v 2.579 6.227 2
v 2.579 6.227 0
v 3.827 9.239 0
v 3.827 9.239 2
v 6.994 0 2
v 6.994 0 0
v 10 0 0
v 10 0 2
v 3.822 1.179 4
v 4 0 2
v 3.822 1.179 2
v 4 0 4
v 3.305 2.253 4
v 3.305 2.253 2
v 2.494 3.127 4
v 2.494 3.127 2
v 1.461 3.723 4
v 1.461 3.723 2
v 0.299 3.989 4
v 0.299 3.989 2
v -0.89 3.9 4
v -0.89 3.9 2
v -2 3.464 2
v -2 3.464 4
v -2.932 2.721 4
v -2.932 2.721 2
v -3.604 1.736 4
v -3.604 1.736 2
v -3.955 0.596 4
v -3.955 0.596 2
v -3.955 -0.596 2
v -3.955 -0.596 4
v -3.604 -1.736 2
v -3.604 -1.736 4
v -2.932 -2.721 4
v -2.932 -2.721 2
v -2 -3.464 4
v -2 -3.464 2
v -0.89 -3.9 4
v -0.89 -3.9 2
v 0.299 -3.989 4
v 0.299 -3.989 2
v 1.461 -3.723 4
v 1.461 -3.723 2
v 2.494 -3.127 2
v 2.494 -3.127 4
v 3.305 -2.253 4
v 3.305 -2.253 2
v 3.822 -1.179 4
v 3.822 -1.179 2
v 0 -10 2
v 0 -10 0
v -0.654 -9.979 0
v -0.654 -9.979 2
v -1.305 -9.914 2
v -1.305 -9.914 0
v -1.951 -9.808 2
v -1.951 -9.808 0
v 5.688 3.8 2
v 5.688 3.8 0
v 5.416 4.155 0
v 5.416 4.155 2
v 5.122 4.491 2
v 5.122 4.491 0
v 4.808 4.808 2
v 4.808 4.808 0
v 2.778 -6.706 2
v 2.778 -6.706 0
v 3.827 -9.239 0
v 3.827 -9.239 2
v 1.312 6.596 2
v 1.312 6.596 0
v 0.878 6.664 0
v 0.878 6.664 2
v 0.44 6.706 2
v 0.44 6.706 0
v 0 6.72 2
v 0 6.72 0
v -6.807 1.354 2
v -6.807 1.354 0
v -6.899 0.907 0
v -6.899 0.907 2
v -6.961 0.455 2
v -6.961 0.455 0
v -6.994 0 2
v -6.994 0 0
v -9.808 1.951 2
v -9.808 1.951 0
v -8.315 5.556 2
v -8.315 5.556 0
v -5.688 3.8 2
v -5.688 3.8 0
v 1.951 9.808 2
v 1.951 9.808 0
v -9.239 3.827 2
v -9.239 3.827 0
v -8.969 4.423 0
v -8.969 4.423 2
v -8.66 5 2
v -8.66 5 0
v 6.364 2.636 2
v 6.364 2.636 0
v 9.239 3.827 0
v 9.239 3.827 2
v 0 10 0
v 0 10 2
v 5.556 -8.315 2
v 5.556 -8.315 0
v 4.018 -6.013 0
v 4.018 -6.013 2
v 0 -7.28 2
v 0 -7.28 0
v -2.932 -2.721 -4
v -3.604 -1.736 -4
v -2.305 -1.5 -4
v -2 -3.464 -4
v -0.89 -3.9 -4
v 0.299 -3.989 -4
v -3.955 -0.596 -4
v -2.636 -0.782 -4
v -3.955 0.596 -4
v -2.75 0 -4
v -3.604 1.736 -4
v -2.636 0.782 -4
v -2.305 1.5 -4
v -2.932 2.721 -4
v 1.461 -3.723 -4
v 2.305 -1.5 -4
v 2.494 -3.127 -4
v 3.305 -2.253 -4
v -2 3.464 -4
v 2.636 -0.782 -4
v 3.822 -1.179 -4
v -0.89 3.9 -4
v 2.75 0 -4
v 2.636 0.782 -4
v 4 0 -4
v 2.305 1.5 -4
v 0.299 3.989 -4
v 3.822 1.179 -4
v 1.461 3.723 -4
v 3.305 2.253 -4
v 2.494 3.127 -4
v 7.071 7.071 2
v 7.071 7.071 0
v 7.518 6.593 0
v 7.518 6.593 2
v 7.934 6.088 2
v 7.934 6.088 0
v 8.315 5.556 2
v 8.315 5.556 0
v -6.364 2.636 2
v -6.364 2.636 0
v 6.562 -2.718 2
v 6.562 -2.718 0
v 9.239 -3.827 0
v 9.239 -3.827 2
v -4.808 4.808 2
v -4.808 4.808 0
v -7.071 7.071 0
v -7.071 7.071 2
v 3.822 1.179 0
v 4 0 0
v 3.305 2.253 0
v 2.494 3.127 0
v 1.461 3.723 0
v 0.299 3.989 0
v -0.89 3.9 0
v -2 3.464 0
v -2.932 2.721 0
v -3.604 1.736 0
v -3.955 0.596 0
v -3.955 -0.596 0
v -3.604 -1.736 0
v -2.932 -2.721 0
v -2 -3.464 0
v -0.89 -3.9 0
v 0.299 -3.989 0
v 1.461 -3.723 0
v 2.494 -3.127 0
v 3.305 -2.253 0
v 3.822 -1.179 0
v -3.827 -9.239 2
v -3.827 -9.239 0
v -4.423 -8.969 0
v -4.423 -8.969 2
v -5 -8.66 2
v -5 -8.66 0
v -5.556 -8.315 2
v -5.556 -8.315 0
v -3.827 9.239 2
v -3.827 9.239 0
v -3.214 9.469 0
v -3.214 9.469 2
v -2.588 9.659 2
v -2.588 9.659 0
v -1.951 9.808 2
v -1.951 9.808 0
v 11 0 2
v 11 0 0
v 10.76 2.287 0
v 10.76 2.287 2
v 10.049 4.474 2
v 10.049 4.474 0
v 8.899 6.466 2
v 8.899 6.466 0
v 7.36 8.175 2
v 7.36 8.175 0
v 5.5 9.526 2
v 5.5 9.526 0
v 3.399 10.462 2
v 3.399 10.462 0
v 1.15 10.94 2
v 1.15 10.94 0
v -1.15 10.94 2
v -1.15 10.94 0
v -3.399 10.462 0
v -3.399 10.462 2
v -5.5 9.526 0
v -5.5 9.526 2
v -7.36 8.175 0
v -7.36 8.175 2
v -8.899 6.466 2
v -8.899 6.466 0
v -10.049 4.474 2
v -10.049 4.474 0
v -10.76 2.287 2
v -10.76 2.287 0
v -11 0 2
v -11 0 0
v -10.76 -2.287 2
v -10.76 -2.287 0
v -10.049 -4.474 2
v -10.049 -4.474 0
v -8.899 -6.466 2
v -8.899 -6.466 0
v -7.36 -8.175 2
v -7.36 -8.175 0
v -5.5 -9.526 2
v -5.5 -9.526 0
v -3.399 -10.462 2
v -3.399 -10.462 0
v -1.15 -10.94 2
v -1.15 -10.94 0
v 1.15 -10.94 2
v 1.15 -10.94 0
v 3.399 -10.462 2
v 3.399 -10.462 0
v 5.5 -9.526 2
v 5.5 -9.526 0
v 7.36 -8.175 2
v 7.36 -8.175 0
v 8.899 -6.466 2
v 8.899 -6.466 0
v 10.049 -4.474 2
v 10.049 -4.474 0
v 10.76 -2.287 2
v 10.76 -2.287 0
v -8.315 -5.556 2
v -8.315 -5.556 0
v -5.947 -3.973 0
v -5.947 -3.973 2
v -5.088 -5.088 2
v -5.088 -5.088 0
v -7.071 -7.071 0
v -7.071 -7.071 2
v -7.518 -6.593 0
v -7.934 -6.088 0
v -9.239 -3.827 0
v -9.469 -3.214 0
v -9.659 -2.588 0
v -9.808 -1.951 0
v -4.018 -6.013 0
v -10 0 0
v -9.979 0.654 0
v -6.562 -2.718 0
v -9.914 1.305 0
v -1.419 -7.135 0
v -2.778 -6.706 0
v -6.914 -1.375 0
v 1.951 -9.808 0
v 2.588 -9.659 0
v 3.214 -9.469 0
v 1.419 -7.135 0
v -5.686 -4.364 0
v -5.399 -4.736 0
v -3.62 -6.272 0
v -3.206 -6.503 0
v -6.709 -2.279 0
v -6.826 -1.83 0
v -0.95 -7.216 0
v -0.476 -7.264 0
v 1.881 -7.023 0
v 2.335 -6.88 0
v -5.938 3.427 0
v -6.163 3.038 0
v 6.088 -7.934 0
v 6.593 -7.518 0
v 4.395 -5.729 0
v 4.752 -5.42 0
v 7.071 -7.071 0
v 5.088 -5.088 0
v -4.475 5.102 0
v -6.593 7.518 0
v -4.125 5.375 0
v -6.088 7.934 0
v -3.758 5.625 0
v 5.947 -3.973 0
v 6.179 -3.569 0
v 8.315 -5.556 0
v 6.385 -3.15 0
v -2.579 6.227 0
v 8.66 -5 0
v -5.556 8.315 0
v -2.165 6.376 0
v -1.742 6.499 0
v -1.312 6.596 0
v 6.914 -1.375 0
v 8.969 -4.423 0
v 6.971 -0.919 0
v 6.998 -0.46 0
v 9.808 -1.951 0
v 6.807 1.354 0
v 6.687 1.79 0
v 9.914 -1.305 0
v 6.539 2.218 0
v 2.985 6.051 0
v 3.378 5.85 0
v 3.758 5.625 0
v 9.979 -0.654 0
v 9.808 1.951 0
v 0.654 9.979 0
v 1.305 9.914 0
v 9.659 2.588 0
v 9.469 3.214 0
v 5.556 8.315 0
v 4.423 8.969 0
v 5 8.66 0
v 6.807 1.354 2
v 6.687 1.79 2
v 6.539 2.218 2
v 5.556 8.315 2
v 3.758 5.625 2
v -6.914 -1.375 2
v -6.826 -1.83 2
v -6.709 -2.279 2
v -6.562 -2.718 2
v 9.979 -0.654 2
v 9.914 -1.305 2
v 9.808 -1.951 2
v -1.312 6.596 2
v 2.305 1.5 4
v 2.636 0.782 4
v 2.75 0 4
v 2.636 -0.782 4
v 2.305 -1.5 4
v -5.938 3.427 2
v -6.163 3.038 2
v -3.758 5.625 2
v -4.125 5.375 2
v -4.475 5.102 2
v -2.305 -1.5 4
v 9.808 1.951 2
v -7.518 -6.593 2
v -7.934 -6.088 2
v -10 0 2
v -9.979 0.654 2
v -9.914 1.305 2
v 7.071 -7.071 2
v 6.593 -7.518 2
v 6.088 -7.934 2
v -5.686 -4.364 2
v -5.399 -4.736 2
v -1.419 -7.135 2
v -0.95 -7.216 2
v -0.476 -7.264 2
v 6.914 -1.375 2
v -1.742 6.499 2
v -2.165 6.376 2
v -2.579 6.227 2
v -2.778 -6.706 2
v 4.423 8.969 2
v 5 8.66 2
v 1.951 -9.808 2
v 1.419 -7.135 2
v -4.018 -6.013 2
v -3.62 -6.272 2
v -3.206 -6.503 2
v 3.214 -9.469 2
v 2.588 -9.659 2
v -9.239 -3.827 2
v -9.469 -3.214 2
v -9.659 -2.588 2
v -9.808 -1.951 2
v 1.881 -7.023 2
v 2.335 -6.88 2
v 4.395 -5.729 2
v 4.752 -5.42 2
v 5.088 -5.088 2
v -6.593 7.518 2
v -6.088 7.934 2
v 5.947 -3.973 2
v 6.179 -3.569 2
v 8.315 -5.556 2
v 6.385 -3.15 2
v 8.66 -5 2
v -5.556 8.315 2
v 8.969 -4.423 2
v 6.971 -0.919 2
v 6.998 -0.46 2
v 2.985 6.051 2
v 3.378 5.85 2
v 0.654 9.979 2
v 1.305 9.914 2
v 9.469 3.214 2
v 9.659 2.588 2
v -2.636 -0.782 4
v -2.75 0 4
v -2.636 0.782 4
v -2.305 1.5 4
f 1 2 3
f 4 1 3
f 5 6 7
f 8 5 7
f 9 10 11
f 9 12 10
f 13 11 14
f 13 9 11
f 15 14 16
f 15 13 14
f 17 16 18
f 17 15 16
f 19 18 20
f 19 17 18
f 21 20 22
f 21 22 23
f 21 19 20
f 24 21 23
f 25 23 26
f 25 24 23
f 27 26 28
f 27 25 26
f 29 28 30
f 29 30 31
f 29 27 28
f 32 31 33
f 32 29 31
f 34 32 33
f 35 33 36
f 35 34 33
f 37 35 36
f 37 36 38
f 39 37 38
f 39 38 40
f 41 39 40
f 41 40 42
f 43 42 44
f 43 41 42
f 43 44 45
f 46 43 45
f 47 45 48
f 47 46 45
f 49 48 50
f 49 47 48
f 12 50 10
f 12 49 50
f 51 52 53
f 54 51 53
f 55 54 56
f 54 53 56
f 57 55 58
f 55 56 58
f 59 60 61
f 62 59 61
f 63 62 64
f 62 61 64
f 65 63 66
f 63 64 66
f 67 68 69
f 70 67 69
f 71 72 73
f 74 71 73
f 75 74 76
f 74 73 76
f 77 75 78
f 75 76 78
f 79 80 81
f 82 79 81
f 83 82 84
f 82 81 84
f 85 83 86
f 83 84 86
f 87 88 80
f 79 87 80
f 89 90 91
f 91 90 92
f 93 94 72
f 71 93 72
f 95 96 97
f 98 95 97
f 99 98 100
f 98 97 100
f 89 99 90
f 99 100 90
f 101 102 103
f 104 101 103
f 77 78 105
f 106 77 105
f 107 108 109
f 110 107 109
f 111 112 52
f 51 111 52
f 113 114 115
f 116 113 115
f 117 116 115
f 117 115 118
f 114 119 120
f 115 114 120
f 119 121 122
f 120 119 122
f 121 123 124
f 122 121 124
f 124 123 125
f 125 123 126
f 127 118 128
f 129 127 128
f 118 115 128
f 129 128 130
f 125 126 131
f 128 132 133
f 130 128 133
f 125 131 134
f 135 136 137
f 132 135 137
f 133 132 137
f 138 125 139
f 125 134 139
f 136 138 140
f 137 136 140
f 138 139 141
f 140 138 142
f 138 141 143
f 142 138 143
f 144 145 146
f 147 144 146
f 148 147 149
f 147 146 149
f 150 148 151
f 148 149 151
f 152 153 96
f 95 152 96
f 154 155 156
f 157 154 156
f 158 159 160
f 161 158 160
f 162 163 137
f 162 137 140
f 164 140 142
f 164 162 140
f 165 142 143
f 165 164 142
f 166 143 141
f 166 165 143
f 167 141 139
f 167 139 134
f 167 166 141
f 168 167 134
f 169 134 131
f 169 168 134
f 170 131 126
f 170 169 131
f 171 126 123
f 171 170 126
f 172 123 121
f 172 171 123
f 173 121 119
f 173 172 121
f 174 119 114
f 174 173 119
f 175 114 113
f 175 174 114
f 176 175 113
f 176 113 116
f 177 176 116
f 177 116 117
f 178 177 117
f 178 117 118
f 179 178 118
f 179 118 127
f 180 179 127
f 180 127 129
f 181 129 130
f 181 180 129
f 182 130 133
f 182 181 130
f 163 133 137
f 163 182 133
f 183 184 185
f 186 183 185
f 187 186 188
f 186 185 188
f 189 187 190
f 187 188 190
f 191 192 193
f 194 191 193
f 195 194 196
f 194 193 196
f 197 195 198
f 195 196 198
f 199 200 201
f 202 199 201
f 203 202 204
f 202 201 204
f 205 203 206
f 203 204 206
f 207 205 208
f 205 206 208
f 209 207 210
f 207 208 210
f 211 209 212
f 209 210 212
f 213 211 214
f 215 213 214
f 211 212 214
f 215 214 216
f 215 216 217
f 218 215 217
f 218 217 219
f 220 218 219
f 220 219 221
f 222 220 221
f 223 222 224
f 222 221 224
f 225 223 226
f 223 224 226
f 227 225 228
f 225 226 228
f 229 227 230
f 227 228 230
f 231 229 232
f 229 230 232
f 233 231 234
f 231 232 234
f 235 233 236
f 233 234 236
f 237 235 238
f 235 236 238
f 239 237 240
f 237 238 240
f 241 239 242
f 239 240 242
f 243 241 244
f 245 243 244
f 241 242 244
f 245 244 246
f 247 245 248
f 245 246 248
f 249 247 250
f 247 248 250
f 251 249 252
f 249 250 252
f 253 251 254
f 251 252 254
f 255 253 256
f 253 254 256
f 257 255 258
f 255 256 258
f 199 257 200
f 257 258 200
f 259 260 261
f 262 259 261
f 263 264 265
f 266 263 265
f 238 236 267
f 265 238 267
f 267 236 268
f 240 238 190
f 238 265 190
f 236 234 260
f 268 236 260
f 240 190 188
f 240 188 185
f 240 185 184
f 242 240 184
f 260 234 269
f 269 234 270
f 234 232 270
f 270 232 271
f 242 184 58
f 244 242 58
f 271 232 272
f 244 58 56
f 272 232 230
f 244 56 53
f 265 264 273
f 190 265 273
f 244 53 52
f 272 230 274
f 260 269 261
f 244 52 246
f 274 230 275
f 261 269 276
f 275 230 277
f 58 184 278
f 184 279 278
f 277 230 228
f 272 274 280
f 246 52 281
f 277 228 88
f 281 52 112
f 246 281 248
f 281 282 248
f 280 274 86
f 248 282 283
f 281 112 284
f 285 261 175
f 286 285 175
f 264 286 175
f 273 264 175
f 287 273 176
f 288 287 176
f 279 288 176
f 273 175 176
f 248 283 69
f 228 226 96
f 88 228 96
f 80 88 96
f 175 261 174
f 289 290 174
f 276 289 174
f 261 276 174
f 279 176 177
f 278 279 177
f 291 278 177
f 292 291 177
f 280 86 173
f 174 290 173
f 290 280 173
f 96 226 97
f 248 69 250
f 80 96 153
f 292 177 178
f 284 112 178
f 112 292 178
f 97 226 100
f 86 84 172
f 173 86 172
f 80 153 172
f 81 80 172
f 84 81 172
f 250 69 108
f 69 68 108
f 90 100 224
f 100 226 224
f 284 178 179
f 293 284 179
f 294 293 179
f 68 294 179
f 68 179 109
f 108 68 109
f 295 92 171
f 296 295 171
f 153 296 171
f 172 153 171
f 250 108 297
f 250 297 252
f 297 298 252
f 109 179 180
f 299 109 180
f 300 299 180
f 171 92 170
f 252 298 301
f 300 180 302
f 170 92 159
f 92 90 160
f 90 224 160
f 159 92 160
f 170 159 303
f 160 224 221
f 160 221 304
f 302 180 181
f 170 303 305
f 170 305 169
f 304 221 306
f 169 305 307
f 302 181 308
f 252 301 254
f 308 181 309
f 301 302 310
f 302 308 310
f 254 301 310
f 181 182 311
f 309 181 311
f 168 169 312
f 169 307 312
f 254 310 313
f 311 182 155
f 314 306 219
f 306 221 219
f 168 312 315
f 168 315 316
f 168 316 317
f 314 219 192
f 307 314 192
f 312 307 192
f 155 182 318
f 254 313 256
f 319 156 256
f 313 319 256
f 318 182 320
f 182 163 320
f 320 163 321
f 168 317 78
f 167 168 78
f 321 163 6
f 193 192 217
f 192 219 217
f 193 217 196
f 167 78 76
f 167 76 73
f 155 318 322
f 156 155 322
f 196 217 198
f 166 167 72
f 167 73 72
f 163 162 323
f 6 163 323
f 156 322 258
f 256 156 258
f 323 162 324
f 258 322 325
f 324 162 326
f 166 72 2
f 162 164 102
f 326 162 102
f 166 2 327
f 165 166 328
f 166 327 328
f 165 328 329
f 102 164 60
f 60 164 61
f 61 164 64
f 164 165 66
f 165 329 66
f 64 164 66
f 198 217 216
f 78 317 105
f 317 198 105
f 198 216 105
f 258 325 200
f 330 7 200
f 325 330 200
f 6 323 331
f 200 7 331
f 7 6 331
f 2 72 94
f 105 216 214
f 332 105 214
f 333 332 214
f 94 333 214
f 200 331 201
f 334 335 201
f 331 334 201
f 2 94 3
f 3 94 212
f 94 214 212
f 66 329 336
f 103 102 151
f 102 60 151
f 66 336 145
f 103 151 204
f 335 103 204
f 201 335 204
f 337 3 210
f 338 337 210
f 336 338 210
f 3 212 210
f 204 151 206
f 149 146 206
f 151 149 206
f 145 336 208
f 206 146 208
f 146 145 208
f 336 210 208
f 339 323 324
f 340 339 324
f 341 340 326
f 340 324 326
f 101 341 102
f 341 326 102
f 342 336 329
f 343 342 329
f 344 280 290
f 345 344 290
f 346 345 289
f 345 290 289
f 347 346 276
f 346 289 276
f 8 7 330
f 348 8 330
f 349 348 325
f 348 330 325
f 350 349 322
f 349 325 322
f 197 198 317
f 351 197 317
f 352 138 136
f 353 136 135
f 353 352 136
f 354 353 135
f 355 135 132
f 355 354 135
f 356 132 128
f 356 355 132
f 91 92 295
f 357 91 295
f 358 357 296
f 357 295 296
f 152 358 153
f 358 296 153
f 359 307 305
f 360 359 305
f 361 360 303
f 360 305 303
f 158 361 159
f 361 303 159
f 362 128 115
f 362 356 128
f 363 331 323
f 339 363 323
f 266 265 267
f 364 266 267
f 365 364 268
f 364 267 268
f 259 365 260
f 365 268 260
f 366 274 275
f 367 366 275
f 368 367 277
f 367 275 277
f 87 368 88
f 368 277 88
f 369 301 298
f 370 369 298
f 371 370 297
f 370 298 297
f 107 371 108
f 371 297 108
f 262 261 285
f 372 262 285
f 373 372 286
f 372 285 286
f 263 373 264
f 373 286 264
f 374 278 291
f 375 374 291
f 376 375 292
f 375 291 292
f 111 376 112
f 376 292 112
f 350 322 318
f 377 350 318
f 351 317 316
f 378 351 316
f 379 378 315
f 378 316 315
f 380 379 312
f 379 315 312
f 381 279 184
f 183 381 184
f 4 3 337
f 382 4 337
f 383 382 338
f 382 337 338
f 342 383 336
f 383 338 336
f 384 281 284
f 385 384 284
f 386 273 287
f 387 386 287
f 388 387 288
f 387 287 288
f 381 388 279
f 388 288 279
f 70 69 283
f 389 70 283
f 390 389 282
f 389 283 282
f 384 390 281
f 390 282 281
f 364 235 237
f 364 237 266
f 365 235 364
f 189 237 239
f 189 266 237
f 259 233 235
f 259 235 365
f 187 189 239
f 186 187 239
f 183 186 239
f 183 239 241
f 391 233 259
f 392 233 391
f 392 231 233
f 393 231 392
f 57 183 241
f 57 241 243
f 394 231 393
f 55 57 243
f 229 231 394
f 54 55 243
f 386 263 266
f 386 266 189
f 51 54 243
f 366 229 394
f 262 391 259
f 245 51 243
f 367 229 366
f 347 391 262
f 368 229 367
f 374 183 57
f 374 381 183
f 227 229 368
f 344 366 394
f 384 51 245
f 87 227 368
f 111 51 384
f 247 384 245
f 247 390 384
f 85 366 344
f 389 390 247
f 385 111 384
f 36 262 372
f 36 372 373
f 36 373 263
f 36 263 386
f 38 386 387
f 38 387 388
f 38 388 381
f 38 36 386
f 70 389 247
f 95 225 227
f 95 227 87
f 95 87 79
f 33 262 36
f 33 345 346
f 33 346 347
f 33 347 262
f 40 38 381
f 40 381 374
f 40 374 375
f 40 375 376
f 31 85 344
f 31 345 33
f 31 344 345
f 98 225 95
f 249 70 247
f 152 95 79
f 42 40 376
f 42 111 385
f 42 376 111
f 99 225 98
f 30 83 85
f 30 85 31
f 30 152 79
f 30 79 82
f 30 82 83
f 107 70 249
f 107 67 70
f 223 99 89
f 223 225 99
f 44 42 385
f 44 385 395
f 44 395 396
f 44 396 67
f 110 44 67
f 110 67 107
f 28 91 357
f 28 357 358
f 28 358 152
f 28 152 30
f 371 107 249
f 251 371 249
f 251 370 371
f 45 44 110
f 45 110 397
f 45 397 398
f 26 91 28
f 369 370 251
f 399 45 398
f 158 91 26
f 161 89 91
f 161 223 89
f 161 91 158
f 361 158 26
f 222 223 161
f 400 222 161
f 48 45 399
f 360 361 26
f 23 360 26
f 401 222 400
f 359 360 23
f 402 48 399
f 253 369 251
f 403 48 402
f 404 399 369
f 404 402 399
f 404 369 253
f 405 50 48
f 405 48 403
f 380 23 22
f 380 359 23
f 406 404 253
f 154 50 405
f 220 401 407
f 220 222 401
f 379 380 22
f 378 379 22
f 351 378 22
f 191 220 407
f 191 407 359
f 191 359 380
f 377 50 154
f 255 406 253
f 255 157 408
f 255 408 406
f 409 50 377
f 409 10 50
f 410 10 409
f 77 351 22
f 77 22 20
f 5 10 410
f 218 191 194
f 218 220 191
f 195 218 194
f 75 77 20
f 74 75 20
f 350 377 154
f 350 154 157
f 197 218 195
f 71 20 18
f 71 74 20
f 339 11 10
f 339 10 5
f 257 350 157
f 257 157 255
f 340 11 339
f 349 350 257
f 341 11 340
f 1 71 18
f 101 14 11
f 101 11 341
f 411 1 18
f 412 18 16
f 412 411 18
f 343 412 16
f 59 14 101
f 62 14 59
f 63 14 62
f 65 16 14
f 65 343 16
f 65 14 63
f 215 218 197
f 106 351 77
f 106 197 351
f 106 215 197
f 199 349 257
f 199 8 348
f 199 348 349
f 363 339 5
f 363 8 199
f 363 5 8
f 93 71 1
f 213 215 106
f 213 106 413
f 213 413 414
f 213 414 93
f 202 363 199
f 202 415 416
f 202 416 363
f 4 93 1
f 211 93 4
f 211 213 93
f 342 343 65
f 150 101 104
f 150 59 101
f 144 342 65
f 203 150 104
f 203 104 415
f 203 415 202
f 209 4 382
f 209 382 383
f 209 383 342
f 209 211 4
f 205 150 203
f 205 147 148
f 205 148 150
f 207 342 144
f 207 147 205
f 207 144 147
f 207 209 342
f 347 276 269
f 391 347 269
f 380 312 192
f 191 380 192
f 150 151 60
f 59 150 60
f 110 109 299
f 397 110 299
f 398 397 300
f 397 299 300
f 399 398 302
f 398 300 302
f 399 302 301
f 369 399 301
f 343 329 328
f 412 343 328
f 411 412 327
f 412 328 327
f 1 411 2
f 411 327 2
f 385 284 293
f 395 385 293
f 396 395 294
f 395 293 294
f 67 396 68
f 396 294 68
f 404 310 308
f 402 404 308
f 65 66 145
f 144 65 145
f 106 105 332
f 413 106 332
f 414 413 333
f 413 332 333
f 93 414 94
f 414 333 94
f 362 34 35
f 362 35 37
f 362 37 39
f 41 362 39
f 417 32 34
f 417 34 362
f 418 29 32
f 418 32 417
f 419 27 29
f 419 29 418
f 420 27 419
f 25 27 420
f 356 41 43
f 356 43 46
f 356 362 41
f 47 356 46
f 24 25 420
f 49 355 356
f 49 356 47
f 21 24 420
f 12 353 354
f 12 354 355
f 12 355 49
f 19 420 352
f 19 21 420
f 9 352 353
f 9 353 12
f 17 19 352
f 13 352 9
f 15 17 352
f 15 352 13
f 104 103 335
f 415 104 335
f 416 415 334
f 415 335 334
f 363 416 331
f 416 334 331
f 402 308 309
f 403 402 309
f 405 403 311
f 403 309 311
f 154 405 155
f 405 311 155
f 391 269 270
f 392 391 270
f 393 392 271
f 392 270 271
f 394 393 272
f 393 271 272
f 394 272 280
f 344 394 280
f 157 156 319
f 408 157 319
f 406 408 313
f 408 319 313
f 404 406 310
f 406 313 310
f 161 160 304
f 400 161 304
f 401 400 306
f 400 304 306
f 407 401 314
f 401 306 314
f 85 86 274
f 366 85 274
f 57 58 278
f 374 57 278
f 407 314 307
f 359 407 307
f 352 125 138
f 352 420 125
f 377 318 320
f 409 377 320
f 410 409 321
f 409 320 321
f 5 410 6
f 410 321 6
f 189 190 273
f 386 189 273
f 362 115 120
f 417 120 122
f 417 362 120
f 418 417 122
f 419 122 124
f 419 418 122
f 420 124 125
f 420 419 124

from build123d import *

# Parameters (mm, degrees)
F0_R     = 4
F1_DEPTH = 4
F0_R_2   = 11
F2_DEPTH = 2


with BuildPart() as f1:
    # F0 (on Top) → F1 (new body, symmetric)
    with BuildSketch(Plane.XY):
        Circle(F0_R)
        with BuildLine():
            ThreePointArc((-2.304886, -1.5), (-2.75, 0), (-2.304886, 1.5))
            Line((-2.304886, 1.5), (2.304886, 1.5))
            ThreePointArc((2.304886, 1.5), (2.75, 0), (2.304886, -1.5))
            Line((2.304886, -1.5), (-2.304886, -1.5))
        make_face(mode=Mode.SUBTRACT)
    extrude(amount=F1_DEPTH, both=True)

    # F0 (on Top) → F2 (join)
    with BuildSketch(Plane.XY):
        Circle(F0_R_2)
        with BuildLine():
            Line((-8.314696, -5.555702), (-5.946591, -3.973385))
            ThreePointArc((-5.946591, -3.973385), (-5.545353, -4.552303), (-5.087967, -5.087967))
            Line((-5.087967, -5.087967), (-7.071068, -7.071068))
            ThreePointArc((-7.071068, -7.071068), (-7.730105, -6.343933), (-8.314696, -5.555702))
        make_face(mode=Mode.SUBTRACT)
        with BuildLine():
            ThreePointArc((0, -10), (-0.980171, -9.951847), (-1.950903, -9.807853))
            Line((-1.950903, -9.807853), (-1.419245, -7.135026))
            ThreePointArc((-1.419245, -7.135026), (-0.713336, -7.24397), (0, -7.280411))
            Line((0, -7.280411), (0, -10))
        make_face(mode=Mode.SUBTRACT)
        with BuildLine():
            Line((-5.555702, -8.314696), (-4.017561, -6.012706))
            ThreePointArc((-4.017561, -6.012706), (-3.41521, -6.390758), (-2.77761, -6.705743))
            Line((-2.77761, -6.705743), (-3.826834, -9.238795))
            ThreePointArc((-3.826834, -9.238795), (-4.713967, -8.819213), (-5.555702, -8.314696))
        make_face(mode=Mode.SUBTRACT)
        with BuildLine():
            Line((-9.807853, -1.950903), (-6.91385, -1.37525))
            ThreePointArc((-6.91385, -1.37525), (-6.771225, -2.055379), (-6.561866, -2.718014))
            Line((-6.561866, -2.718014), (-9.238795, -3.826834))
            ThreePointArc((-9.238795, -3.826834), (-9.569403, -2.902847), (-9.807853, -1.950903))
        make_face(mode=Mode.SUBTRACT)
        with BuildLine():
            Line((1.950903, -9.807853), (1.419245, -7.135026))
            ThreePointArc((1.419245, -7.135026), (2.109376, -6.95503), (2.77761, -6.705743))
            Line((2.77761, -6.705743), (3.826834, -9.238795))
            ThreePointArc((3.826834, -9.238795), (2.902847, -9.569403), (1.950903, -9.807853))
        make_face(mode=Mode.SUBTRACT)
        with BuildLine():
            Line((5.555702, -8.314696), (4.017561, -6.012706))
            ThreePointArc((4.017561, -6.012706), (4.576183, -5.577444), (5.087967, -5.087967))
            Line((5.087967, -5.087967), (7.071068, -7.071068))
            ThreePointArc((7.071068, -7.071068), (6.343933, -7.730105), (5.555702, -8.314696))
        make_face(mode=Mode.SUBTRACT)
        with BuildLine():
            Line((8.314696, -5.555702), (5.946591, -3.973385))
            ThreePointArc((5.946591, -3.973385), (6.285648, -3.361098), (6.561866, -2.718014))
            Line((6.561866, -2.718014), (9.238795, -3.826834))
            ThreePointArc((9.238795, -3.826834), (8.819213, -4.713967), (8.314696, -5.555702))
        make_face(mode=Mode.SUBTRACT)
        with BuildLine():
            Line((9.807853, -1.950903), (6.91385, -1.37525))
            ThreePointArc((6.91385, -1.37525), (6.988029, -0.689611), (6.994381, 0))
            Line((6.994381, 0), (10, 0))
            ThreePointArc((10, 0), (9.951847, -0.980171), (9.807853, -1.950903))
        make_face(mode=Mode.SUBTRACT)
        with BuildLine():
            Line((-9.807853, 1.950903), (-6.806542, 1.353905))
            ThreePointArc((-6.806542, 1.353905), (-6.933587, 0.681549), (-6.994381, 0))
            Line((-6.994381, 0), (-10, 0))
            ThreePointArc((-10, 0), (-9.951847, 0.980171), (-9.807853, 1.950903))
        make_face(mode=Mode.SUBTRACT)
        with BuildLine():
            Line((-8.314696, 5.555702), (-5.687525, 3.800283))
            ThreePointArc((-5.687525, 3.800283), (-6.053617, 3.234376), (-6.363586, 2.635884))
            Line((-6.363586, 2.635884), (-9.238795, 3.826834))
            ThreePointArc((-9.238795, 3.826834), (-8.819213, 4.713967), (-8.314696, 5.555702))
        make_face(mode=Mode.SUBTRACT)
        with BuildLine():
            Line((-5.555702, 8.314696), (-3.758495, 5.624986))
            ThreePointArc((-3.758495, 5.624986), (-4.302483, 5.241241), (-4.807556, 4.807556))
            Line((-4.807556, 4.807556), (-7.071068, 7.071068))
            ThreePointArc((-7.071068, 7.071068), (-6.343933, 7.730105), (-5.555702, 8.314696))
        make_face(mode=Mode.SUBTRACT)
        with BuildLine():
            Line((-1.950903, 9.807853), (-1.311936, 6.595549))
            ThreePointArc((-1.311936, 6.595549), (-1.954337, 6.441238), (-2.579329, 6.227051))
            Line((-2.579329, 6.227051), (-3.826834, 9.238795))
            ThreePointArc((-3.826834, 9.238795), (-2.902847, 9.569403), (-1.950903, 9.807853))
        make_face(mode=Mode.SUBTRACT)
        Circle(F0_R, mode=Mode.SUBTRACT)
        with BuildLine():
            Line((9.807853, 1.950903), (6.806542, 1.353905))
            ThreePointArc((6.806542, 1.353905), (6.616187, 2.005648), (6.363586, 2.635884))
            Line((6.363586, 2.635884), (9.238795, 3.826834))
            ThreePointArc((9.238795, 3.826834), (9.569403, 2.902847), (9.807853, 1.950903))
        make_face(mode=Mode.SUBTRACT)
        with BuildLine():
            Line((8.314696, 5.555702), (5.687525, 3.800283))
            ThreePointArc((5.687525, 3.800283), (5.271653, 4.324985), (4.807556, 4.807556))
            Line((4.807556, 4.807556), (7.071068, 7.071068))
            ThreePointArc((7.071068, 7.071068), (7.730105, 6.343933), (8.314696, 5.555702))
        make_face(mode=Mode.SUBTRACT)
        with BuildLine():
            Line((5.555702, 8.314696), (3.758495, 5.624986))
            ThreePointArc((3.758495, 5.624986), (3.183178, 5.953959), (2.579329, 6.227051))
            Line((2.579329, 6.227051), (3.826834, 9.238795))
            ThreePointArc((3.826834, 9.238795), (4.713967, 8.819213), (5.555702, 8.314696))
        make_face(mode=Mode.SUBTRACT)
        with BuildLine():
            Line((1.950903, 9.807853), (1.311936, 6.595549))
            ThreePointArc((1.311936, 6.595549), (0.658893, 6.68851), (0, 6.719589))
            Line((0, 6.719589), (0, 10))
            ThreePointArc((0, 10), (0.980171, 9.951847), (1.950903, 9.807853))
        make_face(mode=Mode.SUBTRACT)
    extrude(amount=F2_DEPTH)


solid = f1.part
